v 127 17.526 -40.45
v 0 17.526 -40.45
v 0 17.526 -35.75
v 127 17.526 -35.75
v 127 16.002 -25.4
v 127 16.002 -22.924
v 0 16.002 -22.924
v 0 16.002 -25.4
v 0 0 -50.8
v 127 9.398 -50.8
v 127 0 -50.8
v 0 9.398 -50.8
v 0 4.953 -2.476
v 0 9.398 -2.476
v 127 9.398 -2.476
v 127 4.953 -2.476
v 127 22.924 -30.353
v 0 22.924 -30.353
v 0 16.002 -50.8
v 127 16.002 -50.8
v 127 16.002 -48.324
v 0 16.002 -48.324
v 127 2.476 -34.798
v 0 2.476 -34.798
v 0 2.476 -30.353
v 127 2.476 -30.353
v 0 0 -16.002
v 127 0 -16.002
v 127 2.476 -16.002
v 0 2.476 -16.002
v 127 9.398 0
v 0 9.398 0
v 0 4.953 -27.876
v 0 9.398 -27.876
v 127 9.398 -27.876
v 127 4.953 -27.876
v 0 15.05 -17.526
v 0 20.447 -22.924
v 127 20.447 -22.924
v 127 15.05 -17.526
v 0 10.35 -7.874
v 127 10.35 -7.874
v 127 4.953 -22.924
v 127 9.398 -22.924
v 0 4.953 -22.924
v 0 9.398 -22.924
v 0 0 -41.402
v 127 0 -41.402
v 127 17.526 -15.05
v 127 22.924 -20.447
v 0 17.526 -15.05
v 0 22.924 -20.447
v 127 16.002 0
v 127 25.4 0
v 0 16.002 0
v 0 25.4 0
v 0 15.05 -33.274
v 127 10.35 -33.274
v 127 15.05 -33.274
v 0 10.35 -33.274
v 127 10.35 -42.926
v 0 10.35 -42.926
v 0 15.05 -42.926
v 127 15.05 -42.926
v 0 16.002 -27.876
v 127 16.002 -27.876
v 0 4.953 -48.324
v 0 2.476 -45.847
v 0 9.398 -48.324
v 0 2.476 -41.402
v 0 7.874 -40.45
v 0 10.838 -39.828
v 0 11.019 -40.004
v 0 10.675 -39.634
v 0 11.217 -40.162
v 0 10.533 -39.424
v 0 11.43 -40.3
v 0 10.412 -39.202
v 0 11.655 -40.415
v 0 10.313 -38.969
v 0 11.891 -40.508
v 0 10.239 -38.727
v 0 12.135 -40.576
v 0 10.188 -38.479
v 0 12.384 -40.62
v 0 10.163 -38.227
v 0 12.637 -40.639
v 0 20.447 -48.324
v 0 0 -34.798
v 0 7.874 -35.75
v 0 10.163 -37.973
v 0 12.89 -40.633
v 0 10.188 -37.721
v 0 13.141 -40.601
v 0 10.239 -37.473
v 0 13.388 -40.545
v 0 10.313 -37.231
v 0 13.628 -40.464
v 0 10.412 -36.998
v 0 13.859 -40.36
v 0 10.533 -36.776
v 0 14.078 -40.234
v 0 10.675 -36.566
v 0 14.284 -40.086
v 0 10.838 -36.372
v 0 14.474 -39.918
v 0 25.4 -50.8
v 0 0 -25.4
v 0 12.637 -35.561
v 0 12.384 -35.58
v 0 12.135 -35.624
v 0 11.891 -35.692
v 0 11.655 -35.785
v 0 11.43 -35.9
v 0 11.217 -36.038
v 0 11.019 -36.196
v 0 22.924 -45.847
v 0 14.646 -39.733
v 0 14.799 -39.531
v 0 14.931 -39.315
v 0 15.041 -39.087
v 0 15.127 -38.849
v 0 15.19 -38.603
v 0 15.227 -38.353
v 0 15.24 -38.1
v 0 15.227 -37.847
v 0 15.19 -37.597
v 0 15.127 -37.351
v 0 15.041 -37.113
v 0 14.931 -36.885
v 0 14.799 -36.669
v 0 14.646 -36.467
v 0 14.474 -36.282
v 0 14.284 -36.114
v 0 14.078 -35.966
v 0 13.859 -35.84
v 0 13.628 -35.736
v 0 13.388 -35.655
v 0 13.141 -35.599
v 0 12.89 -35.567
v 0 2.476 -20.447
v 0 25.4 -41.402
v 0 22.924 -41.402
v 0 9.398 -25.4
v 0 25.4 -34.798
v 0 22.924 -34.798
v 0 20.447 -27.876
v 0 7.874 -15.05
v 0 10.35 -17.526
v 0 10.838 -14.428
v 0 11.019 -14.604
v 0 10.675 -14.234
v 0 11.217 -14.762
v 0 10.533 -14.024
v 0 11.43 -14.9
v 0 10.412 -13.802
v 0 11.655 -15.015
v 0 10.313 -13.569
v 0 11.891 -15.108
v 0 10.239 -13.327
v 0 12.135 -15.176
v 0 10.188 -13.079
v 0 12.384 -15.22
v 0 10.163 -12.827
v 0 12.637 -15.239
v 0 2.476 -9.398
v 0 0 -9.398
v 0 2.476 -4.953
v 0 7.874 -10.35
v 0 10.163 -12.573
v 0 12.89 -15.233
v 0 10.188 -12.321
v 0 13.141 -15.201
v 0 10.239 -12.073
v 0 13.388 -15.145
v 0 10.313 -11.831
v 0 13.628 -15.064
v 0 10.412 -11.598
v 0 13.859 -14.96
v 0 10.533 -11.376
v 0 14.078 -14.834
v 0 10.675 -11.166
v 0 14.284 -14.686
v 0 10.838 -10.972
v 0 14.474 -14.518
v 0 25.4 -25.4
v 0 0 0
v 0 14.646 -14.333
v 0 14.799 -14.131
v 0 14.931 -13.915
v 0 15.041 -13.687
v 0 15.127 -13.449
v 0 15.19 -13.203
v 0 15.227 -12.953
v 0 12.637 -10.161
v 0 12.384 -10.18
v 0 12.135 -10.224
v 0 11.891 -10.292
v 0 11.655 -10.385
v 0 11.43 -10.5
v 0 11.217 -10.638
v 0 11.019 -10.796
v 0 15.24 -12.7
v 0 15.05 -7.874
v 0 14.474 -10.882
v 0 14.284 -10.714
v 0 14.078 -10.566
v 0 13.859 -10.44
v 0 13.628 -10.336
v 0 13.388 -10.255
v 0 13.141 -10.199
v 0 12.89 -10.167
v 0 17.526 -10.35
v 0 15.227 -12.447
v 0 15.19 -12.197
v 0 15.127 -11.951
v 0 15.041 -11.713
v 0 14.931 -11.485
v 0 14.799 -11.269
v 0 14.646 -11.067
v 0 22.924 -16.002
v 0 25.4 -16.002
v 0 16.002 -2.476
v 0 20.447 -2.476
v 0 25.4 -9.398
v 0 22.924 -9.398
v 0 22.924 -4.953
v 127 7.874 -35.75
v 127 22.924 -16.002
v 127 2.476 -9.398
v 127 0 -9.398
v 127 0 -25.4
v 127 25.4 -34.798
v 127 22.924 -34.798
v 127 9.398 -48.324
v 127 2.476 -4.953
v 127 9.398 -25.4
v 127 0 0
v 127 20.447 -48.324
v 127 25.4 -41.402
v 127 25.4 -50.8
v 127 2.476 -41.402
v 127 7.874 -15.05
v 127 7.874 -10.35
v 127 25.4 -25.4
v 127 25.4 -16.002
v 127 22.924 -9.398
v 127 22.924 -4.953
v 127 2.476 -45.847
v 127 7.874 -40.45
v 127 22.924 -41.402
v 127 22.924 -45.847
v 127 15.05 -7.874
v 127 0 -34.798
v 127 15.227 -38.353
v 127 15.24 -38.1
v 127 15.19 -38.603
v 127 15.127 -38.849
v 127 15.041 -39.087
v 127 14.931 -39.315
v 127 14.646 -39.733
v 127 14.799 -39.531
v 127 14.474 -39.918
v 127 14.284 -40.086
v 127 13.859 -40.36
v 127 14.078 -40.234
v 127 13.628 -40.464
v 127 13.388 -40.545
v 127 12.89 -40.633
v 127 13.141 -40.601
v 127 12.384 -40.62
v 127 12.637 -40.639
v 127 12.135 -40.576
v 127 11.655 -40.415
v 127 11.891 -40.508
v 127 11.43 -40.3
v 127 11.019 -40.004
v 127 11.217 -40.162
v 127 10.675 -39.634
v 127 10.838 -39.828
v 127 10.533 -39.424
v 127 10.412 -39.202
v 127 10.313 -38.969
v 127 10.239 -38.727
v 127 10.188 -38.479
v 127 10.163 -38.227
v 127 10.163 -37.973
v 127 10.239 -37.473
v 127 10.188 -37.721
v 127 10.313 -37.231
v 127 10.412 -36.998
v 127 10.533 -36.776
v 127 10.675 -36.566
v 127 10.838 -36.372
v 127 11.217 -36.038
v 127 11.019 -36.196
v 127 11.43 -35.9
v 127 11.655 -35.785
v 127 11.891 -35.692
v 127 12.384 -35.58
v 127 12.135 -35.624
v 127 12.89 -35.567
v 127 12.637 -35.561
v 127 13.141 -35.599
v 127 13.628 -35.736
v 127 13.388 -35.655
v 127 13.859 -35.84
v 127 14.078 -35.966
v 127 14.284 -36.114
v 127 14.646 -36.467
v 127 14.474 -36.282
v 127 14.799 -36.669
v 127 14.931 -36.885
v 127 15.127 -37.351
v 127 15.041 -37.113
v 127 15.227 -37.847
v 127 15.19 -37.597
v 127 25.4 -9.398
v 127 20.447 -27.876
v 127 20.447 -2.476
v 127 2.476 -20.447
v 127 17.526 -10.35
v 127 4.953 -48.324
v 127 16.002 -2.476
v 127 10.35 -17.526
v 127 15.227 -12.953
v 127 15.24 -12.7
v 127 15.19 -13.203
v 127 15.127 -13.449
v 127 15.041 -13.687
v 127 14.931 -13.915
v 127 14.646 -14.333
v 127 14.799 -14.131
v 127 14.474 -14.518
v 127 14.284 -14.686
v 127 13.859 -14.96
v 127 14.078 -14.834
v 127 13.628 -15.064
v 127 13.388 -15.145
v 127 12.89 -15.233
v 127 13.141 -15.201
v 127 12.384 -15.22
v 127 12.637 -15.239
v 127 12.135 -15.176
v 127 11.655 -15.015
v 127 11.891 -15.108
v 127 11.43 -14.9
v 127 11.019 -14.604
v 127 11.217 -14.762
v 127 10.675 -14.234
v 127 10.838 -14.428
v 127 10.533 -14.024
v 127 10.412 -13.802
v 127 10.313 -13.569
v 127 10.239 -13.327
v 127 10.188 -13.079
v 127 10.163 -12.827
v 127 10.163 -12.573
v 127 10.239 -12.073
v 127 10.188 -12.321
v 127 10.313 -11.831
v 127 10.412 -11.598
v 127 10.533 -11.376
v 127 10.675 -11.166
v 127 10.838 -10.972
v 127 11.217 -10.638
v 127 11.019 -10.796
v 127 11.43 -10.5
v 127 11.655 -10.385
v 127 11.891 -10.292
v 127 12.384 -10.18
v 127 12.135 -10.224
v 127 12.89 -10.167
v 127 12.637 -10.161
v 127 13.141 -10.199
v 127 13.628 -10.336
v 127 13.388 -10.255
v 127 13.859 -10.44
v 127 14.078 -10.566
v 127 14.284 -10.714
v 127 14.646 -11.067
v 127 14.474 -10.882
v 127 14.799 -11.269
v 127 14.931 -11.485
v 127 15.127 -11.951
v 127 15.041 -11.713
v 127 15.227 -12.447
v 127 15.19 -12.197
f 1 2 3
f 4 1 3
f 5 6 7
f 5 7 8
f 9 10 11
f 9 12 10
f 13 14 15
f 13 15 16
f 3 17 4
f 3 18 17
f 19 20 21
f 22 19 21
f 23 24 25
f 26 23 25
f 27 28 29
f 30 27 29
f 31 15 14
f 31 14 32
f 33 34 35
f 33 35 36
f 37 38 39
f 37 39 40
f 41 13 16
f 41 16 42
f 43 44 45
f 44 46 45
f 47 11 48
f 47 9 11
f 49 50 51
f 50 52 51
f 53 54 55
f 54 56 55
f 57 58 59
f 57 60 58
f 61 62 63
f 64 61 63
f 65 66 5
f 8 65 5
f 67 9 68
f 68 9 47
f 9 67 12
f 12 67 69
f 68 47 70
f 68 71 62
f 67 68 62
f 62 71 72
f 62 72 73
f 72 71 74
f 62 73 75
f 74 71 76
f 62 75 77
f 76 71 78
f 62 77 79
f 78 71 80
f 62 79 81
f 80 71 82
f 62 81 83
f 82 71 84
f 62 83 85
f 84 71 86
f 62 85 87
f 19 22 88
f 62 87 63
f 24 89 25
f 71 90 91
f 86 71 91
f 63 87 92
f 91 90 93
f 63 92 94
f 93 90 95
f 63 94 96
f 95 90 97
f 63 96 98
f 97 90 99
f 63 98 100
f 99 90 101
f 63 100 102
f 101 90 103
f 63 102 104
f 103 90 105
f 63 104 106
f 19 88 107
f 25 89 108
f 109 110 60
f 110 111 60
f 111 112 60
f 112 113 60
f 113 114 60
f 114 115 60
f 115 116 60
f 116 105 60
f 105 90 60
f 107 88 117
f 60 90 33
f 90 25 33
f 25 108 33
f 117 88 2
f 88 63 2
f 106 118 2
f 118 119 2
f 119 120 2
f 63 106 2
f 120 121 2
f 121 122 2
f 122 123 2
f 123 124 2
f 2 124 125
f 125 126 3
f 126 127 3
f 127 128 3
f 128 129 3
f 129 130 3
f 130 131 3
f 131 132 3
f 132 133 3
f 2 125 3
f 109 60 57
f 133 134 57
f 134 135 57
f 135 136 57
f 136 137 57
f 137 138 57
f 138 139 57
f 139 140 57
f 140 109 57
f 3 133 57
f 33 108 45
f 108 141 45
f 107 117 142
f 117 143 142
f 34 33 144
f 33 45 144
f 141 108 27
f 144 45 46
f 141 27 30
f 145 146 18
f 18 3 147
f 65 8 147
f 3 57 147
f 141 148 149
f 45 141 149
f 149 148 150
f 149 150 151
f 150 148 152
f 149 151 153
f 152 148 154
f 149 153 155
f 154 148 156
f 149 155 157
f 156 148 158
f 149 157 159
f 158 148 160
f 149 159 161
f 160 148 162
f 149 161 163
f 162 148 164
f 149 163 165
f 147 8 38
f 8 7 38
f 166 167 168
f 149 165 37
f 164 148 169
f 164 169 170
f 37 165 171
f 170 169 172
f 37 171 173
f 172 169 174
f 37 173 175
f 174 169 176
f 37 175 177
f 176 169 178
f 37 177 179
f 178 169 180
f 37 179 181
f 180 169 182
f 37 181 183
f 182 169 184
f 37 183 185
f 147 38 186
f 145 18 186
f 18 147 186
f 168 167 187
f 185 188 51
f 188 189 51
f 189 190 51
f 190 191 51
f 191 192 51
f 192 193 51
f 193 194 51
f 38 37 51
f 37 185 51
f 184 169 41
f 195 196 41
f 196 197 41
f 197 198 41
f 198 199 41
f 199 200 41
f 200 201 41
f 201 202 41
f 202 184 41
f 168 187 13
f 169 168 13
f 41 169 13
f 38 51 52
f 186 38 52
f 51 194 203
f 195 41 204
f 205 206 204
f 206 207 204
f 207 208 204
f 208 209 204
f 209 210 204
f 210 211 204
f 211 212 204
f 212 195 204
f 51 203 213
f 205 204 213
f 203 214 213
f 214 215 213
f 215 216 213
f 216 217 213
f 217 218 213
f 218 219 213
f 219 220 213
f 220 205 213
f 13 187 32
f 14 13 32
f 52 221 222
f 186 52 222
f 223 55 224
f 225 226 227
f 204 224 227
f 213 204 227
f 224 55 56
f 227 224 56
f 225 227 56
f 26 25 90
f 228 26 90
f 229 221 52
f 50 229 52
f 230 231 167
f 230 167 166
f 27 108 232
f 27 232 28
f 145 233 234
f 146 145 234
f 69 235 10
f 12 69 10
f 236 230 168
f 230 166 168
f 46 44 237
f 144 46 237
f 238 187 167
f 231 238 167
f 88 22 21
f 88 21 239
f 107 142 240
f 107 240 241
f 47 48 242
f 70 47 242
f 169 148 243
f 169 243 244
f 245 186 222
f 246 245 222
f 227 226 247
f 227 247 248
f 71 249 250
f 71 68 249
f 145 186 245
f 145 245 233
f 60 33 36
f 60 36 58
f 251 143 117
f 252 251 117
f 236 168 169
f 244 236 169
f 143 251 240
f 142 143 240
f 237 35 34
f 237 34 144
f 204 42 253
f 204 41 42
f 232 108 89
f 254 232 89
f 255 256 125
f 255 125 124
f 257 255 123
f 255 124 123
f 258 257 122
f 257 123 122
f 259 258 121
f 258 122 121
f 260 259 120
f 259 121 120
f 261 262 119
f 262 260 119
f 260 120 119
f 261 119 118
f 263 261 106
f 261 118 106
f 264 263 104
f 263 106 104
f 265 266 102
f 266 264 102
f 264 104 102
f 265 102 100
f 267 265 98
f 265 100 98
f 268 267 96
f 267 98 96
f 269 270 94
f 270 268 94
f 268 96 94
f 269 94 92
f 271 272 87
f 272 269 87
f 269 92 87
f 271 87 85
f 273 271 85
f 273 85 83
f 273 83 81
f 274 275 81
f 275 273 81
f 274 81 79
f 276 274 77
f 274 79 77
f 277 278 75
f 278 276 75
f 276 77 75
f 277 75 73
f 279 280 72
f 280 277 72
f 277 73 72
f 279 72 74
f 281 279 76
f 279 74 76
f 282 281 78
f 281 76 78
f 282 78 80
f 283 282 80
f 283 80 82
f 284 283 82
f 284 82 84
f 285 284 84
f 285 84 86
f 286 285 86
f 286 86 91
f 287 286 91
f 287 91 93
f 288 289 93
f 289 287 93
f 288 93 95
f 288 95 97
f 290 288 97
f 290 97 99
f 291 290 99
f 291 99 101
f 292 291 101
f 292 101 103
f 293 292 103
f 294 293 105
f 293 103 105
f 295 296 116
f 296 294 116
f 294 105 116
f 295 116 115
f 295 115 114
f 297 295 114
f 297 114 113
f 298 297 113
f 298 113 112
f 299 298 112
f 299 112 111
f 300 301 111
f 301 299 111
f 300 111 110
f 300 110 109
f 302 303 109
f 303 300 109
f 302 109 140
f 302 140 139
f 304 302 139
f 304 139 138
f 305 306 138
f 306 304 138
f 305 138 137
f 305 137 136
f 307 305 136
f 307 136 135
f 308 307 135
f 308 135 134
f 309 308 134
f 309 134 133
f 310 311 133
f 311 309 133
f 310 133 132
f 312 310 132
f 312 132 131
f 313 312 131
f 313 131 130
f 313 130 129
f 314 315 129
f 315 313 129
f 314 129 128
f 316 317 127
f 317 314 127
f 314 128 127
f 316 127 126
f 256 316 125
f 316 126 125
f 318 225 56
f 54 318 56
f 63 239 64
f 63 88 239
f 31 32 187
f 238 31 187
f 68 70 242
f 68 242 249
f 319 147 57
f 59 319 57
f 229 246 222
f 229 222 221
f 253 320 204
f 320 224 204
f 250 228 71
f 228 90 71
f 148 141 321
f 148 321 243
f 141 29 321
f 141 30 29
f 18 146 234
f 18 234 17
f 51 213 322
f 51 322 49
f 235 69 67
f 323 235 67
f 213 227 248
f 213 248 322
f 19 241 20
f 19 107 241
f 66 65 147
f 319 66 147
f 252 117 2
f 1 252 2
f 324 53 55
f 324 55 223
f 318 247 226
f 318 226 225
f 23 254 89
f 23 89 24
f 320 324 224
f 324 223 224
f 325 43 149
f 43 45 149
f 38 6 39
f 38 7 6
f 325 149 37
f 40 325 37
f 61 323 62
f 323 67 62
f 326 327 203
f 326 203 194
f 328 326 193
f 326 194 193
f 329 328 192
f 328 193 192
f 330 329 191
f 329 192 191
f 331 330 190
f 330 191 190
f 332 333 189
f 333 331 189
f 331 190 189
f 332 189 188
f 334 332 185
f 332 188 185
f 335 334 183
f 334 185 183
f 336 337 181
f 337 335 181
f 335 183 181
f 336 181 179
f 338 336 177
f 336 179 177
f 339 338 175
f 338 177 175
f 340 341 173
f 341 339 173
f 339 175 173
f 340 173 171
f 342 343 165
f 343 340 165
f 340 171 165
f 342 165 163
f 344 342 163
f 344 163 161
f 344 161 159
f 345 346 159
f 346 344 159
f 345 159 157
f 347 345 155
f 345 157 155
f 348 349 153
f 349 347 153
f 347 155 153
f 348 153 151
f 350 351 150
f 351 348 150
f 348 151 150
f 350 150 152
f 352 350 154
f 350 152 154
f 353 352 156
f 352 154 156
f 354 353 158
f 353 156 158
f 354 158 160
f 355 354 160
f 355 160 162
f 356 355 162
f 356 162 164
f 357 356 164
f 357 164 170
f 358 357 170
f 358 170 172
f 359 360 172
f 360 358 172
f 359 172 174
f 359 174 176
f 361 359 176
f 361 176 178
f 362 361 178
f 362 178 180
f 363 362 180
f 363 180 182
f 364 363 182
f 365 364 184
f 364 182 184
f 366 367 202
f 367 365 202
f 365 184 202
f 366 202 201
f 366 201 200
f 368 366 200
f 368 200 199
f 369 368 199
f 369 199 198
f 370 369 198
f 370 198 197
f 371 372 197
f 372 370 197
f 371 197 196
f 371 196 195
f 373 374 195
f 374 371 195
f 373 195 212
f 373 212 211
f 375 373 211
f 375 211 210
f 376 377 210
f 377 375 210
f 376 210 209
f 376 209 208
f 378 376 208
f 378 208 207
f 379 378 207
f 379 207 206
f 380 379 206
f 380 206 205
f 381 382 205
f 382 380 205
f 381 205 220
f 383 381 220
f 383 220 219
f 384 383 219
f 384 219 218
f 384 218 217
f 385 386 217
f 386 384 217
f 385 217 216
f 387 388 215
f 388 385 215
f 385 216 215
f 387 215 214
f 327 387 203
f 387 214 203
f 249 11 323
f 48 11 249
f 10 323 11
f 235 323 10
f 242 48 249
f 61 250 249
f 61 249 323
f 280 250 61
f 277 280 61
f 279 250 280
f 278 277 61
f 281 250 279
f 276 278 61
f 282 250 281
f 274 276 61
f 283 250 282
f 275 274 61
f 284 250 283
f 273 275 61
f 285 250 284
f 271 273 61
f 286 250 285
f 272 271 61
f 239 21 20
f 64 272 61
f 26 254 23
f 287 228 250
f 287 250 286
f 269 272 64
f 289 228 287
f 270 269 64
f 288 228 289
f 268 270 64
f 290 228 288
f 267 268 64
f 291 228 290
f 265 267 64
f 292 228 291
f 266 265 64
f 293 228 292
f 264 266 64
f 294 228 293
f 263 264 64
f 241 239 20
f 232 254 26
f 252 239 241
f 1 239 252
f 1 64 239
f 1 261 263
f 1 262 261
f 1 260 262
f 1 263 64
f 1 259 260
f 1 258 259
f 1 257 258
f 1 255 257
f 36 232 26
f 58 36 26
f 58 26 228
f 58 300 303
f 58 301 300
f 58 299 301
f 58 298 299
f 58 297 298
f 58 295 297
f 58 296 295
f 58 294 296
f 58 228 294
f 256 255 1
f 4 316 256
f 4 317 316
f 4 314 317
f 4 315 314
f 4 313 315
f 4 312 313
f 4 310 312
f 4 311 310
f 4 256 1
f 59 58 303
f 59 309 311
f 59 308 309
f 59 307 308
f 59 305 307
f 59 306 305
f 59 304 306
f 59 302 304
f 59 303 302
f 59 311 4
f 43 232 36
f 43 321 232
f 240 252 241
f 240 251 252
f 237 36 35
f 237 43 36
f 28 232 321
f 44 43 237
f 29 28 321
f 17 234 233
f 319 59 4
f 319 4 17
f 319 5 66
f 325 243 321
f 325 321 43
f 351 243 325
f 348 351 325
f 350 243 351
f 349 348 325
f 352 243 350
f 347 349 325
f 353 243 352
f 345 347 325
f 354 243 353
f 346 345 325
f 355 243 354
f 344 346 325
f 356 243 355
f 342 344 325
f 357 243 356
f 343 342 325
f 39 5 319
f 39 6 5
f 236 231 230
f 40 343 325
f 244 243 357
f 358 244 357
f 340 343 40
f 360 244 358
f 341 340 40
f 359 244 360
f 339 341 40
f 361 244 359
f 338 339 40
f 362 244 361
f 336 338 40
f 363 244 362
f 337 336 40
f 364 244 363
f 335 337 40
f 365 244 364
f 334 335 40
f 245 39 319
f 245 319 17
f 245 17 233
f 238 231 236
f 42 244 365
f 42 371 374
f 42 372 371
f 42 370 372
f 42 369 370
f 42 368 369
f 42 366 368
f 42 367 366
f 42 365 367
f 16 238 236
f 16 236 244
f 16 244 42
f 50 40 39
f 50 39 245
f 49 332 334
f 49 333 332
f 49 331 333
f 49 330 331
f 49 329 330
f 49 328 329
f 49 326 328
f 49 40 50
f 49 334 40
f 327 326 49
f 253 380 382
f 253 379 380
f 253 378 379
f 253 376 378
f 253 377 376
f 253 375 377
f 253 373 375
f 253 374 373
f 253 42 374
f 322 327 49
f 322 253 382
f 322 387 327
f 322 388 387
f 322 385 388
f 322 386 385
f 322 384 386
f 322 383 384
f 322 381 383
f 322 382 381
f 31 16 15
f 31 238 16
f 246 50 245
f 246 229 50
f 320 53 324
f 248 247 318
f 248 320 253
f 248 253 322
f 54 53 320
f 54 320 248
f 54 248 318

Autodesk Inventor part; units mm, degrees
ref_plane "YZ Plane" through (0, 0, 0) normal (1, 0, 0) x (0, 1, 0)
ref_plane "XZ Plane" through (0, 0, 0) normal (0, 1, 0) x (-1, 0, 0)
ref_plane "XY Plane" through (0, 0, 0) normal (0, 0, 1) x (1, 0, 0)
sketch "Sketch1" plane through (0, 0, 0) normal (1, 0, 0) x (0, 1, 0)
  line L0 (0, 0) -> (0, -9.398)
  line L1 (0, -9.398) -> (2.4765, -9.398)
  line L2 (9.398, -2.4765) -> (9.398, 0)
  line L3 (9.398, 0) -> (0, 0)
  line L4 (16.002, 0) -> (16.002, -2.4765)
  line L5 (22.9235, -9.398) -> (25.4, -9.398)
  line L6 (25.4, -9.398) -> (25.4, 0)
  line L7 (25.4, 0) -> (16.002, 0)
  line L8 (25.4, -16.002) -> (22.9235, -16.002)
  line L9 (16.002, -22.9235) -> (16.002, -25.4)
  line L10 (25.4, -25.4) -> (25.4, -16.002)
  line L11 (0, -16.002) -> (2.4765, -16.002)
  line L12 (9.398, -22.9235) -> (9.398, -25.4)
  line L13 (0, -25.4) -> (0, -16.002)
  line L14 (22.9235, -9.398) -> (22.9235, -4.953)
  line L15 (16.002, -2.4765) -> (20.447, -2.4765)
  line L16 (20.447, -2.4765) -> (15.0495, -7.874)
  line L17 (20.447, -2.4765) -> (28.0802, -2.4765) construction
  line L18 (22.9235, -4.953) -> (17.526, -10.3505)
  line L19 (22.9235, -16.002) -> (22.9235, -20.447)
  line L20 (22.9235, -20.447) -> (17.526, -15.0495)
  line L21 (16.002, -22.9235) -> (20.447, -22.9235)
  line L22 (20.447, -22.9235) -> (15.0495, -17.526)
  line L23 (2.4765, -16.002) -> (2.4765, -20.447)
  line L24 (2.4765, -20.447) -> (7.874, -15.0495)
  line L25 (9.398, -22.9235) -> (4.953, -22.9235)
  line L26 (4.953, -22.9235) -> (10.3505, -17.526)
  line L27 (9.398, -2.4765) -> (4.953, -2.4765)
  line L28 (4.953, -2.4765) -> (10.3505, -7.874)
  line L29 (2.4765, -9.398) -> (2.4765, -4.953)
  line L30 (2.4765, -4.953) -> (7.874, -10.3505)
  line L31 (10.3505, -7.874) -> (15.0495, -7.874)
  line L32 (17.526, -10.3505) -> (17.526, -15.0495)
  line L33 (10.3505, -17.526) -> (15.0495, -17.526)
  line L34 (7.874, -15.0495) -> (7.874, -10.3505)
  circle A0 centre (12.7, -12.7) radius 2.54
  line L35 (0, -50.8) -> (0, -41.402)
  line L36 (0, -41.402) -> (2.4765, -41.402)
  line L37 (9.398, -48.3235) -> (9.398, -50.8)
  line L38 (9.398, -50.8) -> (0, -50.8)
  line L39 (16.002, -50.8) -> (16.002, -48.3235)
  line L40 (22.9235, -41.402) -> (25.4, -41.402)
  line L41 (25.4, -41.402) -> (25.4, -50.8)
  line L42 (25.4, -50.8) -> (16.002, -50.8)
  line L43 (25.4, -34.798) -> (22.9235, -34.798)
  line L44 (16.002, -27.8765) -> (16.002, -25.4)
  line L45 (25.4, -25.4) -> (25.4, -34.798)
  line L46 (0, -34.798) -> (2.4765, -34.798)
  line L47 (9.398, -27.8765) -> (9.398, -25.4)
  line L48 (0, -25.4) -> (0, -34.798)
  line L49 (22.9235, -41.402) -> (22.9235, -45.847)
  line L50 (16.002, -48.3235) -> (20.447, -48.3235)
  line L51 (20.447, -48.3235) -> (15.0495, -42.926)
  line L52 (20.447, -48.3235) -> (28.0802, -48.3235) construction
  line L53 (22.9235, -45.847) -> (17.526, -40.4495)
  line L54 (22.9235, -34.798) -> (22.9235, -30.353)
  line L55 (22.9235, -30.353) -> (17.526, -35.7505)
  line L56 (16.002, -27.8765) -> (20.447, -27.8765)
  line L57 (20.447, -27.8765) -> (15.0495, -33.274)
  line L58 (2.4765, -34.798) -> (2.4765, -30.353)
  line L59 (2.4765, -30.353) -> (7.874, -35.7505)
  line L60 (9.398, -27.8765) -> (4.953, -27.8765)
  line L61 (4.953, -27.8765) -> (10.3505, -33.274)
  line L62 (9.398, -48.3235) -> (4.953, -48.3235)
  line L63 (4.953, -48.3235) -> (10.3505, -42.926)
  line L64 (2.4765, -41.402) -> (2.4765, -45.847)
  line L65 (2.4765, -45.847) -> (7.874, -40.4495)
  line L66 (10.3505, -42.926) -> (15.0495, -42.926)
  line L67 (17.526, -40.4495) -> (17.526, -35.7505)
  line L68 (10.3505, -33.274) -> (15.0495, -33.274)
  line L69 (7.874, -35.7505) -> (7.874, -40.4495)
  circle A1 centre (12.7, -38.1) radius 2.54
  dimension "d2" = 9.398
  dimension "d3" = 2.4765
  dimension "d7" = 2.4765
  dimension "d10" = 2.4765
  dimension "d11" = 25.4
  dimension "d13" = 2.4765
  dimension "d16" = 2.4765
  dimension "d17" = 9.398
  dimension "d23" = 2.4765
  dimension "d25" = 25.4
  dimension "d32" = 4.445
  dimension "d33" = 4.445
  dimension "d35" = 135
  dimension "d36" = 4.445
  dimension "d37" = 4.445
  dimension "d38" = 2.4765
  dimension "d40" = 4.445
  dimension "d41" = 4.445
  dimension "d42" = 4.445
  dimension "d43" = 4.445
  dimension "d44" = 5.08
extrude "Extrusion1" add sketch "Sketch1" along normal blind 127
properties part number "LatX24in1"
